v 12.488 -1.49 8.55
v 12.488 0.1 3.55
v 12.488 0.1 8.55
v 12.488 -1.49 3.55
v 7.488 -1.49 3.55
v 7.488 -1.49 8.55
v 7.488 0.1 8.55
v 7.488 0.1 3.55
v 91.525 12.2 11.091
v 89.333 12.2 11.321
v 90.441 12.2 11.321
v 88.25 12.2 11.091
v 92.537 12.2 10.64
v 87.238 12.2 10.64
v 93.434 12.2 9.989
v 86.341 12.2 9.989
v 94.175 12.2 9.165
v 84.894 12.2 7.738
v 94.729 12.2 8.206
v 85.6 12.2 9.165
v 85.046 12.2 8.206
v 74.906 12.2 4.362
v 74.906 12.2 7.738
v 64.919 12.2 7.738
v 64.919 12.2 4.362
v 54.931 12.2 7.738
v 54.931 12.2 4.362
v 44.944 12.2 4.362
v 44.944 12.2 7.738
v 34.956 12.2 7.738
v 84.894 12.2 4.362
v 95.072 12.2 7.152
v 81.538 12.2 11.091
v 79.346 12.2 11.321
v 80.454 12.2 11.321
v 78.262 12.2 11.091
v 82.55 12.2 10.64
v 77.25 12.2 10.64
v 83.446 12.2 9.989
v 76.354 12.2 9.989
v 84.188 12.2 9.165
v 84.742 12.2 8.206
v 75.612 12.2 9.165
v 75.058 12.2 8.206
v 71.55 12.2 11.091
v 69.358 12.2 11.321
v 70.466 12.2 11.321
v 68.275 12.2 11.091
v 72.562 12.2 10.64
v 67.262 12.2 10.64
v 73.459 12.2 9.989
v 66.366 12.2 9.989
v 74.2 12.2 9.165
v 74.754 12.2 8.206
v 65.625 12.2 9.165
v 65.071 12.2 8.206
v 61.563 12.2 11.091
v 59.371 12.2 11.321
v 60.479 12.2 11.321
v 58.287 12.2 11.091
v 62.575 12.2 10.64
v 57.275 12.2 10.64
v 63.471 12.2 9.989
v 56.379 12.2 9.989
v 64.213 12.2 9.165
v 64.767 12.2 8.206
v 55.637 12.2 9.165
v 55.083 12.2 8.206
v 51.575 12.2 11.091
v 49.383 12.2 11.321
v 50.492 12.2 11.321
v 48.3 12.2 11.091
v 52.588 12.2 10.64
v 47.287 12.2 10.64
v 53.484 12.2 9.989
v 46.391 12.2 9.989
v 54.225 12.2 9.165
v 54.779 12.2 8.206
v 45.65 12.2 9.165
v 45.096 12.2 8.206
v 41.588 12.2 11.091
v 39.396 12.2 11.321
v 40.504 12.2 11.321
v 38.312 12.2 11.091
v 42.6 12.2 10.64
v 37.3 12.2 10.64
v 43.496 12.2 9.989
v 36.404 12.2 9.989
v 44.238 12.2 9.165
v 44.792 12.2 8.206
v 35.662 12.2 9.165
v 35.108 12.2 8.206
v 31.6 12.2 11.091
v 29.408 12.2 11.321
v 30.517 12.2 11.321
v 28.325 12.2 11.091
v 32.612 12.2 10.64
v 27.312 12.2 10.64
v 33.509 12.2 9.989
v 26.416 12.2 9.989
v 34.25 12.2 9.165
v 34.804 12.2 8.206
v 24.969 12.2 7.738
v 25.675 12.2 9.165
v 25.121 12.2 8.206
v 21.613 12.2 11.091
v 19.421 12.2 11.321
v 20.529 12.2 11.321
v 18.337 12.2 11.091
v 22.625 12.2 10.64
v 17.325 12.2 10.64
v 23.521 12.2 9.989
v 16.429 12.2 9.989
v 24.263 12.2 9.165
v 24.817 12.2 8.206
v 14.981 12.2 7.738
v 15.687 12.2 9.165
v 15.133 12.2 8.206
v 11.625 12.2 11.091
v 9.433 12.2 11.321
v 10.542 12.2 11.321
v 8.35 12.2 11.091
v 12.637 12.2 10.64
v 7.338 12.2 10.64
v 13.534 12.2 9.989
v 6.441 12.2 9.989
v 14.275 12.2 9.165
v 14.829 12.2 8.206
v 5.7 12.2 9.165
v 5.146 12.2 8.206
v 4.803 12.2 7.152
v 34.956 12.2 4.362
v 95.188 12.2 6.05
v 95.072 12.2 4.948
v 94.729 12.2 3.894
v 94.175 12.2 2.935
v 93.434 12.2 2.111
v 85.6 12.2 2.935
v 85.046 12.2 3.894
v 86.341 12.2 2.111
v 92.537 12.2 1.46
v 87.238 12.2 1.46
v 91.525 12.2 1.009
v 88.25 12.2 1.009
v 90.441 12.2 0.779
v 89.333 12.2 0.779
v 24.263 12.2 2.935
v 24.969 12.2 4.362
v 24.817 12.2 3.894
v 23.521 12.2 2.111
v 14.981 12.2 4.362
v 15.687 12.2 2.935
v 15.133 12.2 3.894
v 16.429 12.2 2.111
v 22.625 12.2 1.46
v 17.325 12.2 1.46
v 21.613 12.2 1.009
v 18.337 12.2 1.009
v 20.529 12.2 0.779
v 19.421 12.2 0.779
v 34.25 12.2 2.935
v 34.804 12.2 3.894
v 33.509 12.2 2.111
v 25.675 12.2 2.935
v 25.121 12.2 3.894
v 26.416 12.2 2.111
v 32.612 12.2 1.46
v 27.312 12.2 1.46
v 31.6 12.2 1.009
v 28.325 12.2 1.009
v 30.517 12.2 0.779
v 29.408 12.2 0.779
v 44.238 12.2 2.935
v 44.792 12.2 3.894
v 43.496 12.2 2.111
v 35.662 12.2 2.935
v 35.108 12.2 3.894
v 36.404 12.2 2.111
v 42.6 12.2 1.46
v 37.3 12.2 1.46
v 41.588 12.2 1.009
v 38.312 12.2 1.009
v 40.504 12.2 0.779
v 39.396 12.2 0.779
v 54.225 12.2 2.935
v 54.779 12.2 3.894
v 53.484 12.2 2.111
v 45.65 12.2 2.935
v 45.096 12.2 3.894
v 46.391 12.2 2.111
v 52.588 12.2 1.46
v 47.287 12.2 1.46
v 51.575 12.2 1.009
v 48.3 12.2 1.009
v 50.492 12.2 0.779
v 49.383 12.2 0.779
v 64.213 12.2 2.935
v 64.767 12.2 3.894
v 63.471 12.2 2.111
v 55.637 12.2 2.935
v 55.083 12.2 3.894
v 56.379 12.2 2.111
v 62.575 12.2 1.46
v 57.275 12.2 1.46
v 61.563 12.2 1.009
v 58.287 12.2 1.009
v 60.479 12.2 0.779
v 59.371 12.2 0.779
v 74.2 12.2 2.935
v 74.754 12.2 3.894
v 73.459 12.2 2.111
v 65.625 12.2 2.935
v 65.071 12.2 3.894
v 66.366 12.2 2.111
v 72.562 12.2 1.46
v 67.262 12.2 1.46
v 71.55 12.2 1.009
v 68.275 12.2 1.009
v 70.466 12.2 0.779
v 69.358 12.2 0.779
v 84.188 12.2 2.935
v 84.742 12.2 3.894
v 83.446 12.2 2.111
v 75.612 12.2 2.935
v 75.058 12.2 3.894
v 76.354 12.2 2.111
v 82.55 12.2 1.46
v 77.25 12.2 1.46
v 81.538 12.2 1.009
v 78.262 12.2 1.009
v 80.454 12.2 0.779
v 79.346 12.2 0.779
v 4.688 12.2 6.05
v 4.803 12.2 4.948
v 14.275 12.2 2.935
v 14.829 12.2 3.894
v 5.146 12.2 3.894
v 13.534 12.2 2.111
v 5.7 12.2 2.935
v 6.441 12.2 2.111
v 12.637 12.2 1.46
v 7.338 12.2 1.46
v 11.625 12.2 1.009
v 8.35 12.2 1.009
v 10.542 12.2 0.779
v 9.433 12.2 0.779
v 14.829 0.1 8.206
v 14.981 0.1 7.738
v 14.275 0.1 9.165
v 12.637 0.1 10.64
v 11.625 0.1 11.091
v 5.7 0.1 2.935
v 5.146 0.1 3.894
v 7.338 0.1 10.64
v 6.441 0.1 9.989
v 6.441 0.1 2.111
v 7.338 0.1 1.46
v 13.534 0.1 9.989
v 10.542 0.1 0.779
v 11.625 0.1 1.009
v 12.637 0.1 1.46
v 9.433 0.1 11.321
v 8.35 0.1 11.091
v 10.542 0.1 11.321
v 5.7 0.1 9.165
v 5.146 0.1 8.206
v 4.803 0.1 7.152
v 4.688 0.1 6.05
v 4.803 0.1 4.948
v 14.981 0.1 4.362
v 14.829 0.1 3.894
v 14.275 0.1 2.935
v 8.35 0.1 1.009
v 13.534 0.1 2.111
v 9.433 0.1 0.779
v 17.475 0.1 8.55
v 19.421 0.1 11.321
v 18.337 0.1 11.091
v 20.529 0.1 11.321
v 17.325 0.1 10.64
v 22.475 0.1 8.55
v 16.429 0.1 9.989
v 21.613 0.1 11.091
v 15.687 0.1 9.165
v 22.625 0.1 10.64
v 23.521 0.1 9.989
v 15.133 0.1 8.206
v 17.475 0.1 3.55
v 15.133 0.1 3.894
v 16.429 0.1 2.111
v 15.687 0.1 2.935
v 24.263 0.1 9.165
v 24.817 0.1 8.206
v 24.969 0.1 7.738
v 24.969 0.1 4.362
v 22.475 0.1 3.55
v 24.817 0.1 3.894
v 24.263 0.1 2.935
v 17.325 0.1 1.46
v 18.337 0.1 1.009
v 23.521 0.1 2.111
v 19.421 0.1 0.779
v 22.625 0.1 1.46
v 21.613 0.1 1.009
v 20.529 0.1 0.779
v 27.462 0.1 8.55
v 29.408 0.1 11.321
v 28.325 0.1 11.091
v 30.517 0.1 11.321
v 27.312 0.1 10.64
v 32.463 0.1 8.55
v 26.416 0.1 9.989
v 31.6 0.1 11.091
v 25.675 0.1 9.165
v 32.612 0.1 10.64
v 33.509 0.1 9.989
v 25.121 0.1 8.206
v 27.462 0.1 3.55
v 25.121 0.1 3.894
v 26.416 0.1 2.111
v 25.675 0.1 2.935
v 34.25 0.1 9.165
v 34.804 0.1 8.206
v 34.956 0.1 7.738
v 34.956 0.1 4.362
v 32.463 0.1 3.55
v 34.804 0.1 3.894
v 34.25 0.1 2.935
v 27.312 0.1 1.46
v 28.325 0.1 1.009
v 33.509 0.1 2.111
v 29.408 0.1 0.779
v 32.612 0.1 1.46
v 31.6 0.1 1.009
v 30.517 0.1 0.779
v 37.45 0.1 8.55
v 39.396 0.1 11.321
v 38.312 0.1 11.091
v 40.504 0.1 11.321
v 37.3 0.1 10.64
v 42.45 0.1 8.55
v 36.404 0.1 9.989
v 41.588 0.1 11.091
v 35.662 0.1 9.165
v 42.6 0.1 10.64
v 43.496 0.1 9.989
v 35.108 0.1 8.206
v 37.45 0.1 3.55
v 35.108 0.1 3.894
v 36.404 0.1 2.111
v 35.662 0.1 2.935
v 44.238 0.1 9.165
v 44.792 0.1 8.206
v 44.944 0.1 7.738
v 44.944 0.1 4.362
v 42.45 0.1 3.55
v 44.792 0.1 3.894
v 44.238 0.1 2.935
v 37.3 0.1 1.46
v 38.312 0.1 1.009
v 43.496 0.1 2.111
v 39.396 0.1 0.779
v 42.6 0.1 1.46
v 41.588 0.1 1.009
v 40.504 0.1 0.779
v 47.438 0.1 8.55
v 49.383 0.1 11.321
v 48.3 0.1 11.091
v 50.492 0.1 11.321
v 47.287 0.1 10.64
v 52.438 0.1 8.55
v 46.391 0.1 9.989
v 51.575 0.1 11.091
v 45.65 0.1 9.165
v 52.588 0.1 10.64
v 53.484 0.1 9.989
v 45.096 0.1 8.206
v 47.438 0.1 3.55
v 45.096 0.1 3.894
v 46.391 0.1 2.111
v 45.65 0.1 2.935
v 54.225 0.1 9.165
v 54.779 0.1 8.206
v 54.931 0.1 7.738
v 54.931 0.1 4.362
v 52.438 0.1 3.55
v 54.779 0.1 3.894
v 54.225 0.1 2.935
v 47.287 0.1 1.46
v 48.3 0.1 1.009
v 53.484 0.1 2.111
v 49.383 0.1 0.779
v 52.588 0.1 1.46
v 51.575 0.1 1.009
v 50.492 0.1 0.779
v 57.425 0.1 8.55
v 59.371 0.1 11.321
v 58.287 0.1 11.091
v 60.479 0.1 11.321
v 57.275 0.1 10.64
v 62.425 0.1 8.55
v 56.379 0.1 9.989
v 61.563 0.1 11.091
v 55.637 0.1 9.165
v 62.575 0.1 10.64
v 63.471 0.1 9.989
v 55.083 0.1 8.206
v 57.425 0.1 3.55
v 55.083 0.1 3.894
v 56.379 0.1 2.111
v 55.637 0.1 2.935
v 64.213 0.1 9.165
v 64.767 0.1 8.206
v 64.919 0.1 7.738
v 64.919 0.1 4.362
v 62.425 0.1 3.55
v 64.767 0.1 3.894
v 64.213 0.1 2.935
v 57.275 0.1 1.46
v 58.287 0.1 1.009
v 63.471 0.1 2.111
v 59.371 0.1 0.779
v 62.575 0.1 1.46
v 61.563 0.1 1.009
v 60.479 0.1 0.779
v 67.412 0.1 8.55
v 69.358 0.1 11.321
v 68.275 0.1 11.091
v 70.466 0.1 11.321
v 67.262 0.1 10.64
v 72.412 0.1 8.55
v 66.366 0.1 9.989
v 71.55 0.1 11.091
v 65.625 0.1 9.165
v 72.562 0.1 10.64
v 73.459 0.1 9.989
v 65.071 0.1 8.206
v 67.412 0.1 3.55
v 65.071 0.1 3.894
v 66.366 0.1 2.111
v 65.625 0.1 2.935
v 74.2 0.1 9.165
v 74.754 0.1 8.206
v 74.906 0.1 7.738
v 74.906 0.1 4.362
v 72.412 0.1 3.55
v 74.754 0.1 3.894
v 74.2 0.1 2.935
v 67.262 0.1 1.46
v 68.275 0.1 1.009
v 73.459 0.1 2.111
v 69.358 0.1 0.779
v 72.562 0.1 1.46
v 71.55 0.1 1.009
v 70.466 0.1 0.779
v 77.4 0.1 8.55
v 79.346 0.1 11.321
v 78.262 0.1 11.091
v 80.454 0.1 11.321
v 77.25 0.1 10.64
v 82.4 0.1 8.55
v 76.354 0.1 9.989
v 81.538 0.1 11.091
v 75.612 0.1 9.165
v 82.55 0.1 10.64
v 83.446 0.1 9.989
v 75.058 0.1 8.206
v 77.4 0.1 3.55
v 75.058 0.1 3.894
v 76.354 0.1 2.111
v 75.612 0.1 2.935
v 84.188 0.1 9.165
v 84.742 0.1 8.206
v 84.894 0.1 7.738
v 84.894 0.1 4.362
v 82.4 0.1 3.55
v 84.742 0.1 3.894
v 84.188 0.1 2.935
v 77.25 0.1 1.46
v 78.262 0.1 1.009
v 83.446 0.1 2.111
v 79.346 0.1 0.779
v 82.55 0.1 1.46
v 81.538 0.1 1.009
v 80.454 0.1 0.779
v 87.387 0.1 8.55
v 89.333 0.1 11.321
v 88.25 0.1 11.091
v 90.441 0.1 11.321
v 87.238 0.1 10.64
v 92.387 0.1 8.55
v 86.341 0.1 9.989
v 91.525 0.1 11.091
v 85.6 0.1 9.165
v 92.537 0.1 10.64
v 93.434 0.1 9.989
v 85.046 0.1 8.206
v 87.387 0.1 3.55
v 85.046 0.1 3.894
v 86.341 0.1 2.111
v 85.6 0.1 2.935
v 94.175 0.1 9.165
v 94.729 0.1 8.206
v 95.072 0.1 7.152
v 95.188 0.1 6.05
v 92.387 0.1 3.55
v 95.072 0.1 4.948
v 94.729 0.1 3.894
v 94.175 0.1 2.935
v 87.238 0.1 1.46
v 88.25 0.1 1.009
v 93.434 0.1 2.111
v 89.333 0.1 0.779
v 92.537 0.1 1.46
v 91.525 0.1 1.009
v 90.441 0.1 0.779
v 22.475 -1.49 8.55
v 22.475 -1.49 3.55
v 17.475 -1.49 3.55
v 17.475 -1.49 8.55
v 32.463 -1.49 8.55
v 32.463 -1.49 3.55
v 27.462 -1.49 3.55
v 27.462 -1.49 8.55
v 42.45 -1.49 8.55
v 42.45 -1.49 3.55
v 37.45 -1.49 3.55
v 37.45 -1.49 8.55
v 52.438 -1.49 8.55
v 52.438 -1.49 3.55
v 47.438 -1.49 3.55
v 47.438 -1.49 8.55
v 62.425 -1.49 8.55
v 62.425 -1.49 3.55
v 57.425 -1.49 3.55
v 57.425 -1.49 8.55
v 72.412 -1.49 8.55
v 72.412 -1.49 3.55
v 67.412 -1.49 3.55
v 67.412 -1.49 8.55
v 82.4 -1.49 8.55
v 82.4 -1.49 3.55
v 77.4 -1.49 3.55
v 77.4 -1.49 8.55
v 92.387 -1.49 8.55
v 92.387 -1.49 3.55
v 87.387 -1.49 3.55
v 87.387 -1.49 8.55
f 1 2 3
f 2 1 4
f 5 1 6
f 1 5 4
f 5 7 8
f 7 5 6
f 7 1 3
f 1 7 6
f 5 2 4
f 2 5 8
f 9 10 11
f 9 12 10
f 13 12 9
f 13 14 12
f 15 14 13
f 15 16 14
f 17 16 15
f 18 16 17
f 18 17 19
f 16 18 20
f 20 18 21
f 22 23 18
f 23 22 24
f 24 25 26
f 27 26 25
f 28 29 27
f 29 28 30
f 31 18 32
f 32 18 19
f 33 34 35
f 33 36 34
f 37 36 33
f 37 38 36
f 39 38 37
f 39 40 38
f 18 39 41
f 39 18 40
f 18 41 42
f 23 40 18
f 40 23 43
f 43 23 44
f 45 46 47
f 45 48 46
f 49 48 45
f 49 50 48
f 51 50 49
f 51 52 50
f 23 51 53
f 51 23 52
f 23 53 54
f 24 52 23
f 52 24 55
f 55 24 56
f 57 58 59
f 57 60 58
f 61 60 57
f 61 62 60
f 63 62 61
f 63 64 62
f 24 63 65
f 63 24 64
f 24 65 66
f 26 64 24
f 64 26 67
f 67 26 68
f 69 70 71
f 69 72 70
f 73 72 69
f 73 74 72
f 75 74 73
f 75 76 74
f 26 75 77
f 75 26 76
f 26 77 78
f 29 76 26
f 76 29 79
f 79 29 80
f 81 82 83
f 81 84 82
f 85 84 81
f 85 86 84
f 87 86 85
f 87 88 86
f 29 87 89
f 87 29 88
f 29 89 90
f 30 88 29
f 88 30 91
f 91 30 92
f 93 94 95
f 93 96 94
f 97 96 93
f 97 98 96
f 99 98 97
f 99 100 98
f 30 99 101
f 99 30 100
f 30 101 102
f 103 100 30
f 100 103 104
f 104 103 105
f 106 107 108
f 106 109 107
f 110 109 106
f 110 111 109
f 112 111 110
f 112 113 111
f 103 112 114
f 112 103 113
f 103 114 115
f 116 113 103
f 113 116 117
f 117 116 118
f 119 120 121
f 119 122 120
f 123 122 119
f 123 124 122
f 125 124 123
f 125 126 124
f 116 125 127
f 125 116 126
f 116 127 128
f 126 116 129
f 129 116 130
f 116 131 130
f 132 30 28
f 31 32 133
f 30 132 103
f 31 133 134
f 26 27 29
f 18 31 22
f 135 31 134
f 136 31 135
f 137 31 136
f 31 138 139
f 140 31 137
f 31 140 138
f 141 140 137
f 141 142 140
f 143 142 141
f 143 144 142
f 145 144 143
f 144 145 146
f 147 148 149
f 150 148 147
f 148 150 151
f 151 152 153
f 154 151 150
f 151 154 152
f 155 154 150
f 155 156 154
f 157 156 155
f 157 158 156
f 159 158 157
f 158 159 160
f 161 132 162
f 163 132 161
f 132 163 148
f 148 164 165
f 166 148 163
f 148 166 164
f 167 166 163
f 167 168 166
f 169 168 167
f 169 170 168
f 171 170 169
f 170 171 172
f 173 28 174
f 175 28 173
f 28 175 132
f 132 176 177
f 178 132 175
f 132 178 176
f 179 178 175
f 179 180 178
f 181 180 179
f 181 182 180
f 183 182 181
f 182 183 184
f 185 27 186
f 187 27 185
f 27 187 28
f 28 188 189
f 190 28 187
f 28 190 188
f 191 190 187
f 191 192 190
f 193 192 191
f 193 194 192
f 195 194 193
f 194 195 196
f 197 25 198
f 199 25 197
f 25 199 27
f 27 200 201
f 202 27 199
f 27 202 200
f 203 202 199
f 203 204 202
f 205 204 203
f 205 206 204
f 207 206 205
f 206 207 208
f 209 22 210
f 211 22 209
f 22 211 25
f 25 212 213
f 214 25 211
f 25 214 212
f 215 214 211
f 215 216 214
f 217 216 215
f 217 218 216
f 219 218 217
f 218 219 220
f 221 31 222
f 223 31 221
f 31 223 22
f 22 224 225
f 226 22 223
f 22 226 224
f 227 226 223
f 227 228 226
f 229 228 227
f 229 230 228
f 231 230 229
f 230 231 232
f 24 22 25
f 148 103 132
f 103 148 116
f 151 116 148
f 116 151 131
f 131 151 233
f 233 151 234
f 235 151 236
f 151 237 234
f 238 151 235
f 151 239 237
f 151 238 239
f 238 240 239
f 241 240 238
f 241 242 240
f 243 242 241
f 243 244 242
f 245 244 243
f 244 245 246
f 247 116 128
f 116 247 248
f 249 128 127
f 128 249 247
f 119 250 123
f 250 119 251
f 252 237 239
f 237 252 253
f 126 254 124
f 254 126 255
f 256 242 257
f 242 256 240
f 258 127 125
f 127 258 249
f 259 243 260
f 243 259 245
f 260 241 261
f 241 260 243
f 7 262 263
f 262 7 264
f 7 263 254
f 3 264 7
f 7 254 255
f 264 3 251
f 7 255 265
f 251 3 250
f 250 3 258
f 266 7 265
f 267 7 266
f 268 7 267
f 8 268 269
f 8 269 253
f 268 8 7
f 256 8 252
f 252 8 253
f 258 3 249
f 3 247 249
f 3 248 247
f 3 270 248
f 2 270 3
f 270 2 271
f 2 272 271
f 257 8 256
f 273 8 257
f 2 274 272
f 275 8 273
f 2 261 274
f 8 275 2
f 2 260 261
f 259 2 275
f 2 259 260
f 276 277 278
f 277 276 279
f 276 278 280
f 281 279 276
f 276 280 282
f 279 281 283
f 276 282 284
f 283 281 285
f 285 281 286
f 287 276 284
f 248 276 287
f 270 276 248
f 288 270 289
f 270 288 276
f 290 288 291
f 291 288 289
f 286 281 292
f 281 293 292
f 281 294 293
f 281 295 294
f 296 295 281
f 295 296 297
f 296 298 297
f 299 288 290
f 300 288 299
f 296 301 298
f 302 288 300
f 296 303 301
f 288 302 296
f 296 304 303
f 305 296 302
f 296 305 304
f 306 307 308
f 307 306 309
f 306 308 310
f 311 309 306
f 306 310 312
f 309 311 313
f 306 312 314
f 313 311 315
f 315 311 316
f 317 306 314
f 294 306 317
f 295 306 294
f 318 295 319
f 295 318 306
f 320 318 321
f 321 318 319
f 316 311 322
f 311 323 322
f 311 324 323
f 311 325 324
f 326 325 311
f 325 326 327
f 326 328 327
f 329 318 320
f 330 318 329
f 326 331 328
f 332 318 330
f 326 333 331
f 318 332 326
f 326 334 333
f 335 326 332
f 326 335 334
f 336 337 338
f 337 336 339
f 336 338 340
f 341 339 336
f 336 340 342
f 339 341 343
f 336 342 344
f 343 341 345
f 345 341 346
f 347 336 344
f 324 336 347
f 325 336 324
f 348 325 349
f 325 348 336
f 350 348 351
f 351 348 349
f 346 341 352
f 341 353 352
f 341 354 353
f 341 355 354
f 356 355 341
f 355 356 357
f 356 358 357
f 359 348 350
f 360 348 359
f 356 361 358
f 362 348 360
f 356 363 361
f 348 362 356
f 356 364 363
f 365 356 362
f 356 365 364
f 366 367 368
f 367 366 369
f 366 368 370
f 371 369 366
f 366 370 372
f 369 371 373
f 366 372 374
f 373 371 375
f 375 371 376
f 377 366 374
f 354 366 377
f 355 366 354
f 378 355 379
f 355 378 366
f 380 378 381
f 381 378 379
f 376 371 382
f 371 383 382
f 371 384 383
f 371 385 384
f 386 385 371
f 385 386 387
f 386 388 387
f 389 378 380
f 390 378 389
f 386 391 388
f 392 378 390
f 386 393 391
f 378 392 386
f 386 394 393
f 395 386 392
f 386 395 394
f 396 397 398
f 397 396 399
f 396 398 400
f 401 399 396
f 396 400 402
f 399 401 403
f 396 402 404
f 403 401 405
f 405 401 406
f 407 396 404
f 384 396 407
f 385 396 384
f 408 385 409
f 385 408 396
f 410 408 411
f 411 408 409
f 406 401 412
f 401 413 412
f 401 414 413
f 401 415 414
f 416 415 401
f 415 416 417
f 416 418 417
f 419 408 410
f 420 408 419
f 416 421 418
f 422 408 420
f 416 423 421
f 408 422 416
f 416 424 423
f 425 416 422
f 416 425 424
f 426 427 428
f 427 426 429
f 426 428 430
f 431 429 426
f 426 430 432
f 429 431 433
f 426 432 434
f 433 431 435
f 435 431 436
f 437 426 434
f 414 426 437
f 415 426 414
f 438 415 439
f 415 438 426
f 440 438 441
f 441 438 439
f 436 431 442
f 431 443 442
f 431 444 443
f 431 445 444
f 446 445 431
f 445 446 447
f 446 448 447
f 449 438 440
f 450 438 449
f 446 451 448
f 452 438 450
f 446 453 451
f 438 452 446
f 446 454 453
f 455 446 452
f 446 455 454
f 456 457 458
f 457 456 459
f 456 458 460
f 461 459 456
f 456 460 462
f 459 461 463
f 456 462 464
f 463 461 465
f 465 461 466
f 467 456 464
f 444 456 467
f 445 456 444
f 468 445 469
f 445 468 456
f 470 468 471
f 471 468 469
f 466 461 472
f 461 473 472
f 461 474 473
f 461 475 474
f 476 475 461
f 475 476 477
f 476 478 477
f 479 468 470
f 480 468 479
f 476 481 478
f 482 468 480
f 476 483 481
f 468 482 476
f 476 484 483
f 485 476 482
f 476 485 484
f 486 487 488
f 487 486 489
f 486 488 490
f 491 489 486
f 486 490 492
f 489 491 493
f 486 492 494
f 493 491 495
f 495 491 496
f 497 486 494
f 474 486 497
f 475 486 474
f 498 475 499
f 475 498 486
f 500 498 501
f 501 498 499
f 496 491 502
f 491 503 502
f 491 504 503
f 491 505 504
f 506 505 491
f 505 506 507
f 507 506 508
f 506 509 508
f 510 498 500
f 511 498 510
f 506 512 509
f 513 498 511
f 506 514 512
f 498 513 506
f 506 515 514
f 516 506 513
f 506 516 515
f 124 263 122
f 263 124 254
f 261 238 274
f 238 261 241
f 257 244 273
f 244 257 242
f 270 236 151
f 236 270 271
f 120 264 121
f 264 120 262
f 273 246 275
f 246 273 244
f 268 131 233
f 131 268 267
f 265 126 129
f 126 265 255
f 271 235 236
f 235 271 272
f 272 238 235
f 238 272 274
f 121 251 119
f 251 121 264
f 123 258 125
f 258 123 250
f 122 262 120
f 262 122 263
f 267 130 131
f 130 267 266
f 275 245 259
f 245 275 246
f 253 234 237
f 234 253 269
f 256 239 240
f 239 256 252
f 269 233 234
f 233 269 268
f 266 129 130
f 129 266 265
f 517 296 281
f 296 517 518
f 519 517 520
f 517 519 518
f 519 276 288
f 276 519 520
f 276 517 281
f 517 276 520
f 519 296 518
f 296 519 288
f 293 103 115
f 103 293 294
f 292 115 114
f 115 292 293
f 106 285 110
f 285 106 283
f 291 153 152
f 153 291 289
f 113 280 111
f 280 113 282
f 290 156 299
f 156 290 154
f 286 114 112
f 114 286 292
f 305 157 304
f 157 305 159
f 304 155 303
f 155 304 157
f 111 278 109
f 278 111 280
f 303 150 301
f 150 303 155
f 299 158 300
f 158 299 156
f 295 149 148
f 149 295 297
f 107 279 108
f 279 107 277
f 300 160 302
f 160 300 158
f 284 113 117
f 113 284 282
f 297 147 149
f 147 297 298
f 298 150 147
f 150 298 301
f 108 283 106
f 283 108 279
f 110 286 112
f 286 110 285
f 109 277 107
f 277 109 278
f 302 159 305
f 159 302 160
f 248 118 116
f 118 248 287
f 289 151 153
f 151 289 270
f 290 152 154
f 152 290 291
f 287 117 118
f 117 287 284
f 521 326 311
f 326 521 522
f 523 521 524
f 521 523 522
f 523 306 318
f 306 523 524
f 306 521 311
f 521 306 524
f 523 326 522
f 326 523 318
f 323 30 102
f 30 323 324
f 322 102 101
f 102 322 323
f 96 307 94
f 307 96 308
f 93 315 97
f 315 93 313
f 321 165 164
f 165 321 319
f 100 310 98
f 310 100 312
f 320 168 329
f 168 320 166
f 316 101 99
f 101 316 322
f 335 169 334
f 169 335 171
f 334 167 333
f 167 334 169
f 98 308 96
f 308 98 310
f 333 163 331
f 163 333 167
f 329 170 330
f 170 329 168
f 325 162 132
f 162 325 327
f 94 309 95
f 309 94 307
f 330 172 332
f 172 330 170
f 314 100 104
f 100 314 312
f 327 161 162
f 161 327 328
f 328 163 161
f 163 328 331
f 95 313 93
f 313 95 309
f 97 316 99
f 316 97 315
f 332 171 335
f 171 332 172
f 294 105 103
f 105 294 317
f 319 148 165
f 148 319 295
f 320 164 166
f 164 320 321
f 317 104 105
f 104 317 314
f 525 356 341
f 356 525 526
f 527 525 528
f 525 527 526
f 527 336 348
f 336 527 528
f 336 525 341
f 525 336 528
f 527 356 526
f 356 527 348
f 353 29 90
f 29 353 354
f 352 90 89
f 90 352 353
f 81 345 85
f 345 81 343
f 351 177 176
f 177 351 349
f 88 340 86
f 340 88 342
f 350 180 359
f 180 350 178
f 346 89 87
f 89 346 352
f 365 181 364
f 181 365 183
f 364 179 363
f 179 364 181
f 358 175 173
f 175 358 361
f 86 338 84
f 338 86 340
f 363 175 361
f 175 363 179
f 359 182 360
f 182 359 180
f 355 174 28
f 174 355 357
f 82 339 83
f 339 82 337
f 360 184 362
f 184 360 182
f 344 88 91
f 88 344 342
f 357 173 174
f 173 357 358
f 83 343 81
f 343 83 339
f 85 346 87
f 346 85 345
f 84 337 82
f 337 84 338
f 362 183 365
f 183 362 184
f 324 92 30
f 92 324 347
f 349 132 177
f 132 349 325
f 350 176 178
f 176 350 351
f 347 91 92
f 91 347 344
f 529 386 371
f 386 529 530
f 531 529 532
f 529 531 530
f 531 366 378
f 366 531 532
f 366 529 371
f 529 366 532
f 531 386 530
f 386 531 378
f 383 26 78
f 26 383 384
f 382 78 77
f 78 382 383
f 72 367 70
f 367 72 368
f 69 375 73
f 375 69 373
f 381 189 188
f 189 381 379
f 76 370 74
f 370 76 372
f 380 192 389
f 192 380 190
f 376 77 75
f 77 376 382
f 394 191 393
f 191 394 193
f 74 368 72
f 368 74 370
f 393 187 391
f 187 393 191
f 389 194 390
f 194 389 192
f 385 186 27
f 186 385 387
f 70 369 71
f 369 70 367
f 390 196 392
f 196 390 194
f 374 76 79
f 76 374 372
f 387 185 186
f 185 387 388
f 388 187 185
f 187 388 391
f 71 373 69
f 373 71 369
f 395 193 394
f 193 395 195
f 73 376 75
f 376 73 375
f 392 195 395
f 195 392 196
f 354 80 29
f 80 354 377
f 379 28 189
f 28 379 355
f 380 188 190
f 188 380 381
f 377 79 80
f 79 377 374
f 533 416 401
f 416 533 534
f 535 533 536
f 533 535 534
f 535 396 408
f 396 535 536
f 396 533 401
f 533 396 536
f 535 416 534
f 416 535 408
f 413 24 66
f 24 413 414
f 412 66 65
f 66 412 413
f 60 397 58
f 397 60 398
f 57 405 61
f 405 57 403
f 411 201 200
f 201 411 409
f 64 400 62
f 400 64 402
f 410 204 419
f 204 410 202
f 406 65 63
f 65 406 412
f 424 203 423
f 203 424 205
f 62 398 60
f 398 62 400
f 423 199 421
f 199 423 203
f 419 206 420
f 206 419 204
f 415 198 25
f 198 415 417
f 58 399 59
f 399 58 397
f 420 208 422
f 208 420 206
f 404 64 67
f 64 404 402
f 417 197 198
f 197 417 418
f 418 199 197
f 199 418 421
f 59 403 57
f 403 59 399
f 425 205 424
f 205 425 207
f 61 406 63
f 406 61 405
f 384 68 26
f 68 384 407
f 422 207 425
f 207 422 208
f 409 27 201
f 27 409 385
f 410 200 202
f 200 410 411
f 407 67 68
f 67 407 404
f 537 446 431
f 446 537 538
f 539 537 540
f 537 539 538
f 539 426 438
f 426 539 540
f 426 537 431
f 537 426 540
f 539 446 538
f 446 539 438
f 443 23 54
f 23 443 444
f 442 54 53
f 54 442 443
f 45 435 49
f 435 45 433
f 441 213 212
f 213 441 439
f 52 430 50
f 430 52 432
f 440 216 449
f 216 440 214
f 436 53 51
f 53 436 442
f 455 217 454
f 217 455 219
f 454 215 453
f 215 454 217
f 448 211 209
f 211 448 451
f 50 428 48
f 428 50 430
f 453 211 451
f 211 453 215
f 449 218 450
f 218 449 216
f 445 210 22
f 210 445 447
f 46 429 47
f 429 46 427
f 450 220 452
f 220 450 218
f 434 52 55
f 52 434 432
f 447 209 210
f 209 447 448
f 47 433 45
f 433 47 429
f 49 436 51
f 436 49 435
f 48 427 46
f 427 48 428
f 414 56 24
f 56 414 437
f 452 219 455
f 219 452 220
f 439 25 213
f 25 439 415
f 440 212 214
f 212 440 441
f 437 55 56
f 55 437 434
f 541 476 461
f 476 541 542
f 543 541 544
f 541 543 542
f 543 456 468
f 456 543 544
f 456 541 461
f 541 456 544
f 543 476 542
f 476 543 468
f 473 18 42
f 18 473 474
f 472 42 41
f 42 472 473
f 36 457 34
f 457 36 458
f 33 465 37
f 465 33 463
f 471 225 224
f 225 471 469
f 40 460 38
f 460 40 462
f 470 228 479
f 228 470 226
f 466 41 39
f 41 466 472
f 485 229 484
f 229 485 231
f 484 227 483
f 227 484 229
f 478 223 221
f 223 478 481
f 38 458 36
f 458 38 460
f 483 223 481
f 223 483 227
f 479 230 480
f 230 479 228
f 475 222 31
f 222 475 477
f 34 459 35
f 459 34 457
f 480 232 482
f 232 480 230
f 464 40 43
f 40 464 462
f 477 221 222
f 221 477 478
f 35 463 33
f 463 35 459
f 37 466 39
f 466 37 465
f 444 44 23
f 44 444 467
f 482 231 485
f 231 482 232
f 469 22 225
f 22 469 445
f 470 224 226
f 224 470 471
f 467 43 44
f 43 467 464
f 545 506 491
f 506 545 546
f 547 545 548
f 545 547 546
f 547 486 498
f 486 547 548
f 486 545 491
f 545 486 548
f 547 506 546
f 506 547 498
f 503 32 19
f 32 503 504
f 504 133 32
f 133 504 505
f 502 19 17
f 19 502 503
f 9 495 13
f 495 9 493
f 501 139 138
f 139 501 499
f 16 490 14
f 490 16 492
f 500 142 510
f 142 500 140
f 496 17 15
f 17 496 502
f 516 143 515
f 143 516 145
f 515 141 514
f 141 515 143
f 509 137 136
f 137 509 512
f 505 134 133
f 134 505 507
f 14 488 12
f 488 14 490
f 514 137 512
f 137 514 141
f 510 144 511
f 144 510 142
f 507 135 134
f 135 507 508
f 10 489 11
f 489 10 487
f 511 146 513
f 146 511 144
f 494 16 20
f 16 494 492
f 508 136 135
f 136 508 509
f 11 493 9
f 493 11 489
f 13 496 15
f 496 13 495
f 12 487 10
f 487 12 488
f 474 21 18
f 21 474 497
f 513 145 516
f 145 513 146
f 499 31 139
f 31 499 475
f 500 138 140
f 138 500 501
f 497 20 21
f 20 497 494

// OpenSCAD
// file: ../lib/neo_pixel.scad
///< Alitovo Neo pixel RGB X000UCVKBH 2812b-1-LED-WH
use <../lib/math.scad>;
use <../lib/utils.scad>;

///< Parameters - Begin
led_assembly_h = 2.8;
led_assembly_d = 9.6;

///< Diameter of the PCB 
pcb_d = 9.6;
pcb_h = 1.2;

///< Demensions of the LED IC
led_w = 5;
led_d = led_w;
led_h = led_assembly_h - pcb_h;


///< Modules
module pcb(h = pcb_h, d = pcb_d){
     ///< LED PCB definition
     ///< The h/d parameters are passed in to
     ///< allow for socketing of the LEDs.
     color( rand_clr() )cylinder( h=h, d=d, $fn = 30 );
}

module led(){
     ///< Neo pixel LED (2812b-1)
     union(){
         color( rand_clr() )cube( [ led_w, led_d, led_h ] );
         color( rand_clr() )
              translate([led_w/2,led_d/2, 0] )
              cylinder( h=led_h, d= led_w, $fn = 30 );
         }
}

module neo_pixel(h=pcb_h, d=pcb_d){
     ///< Assembly of the led and pcb_pad
     union(){
          translate([-led_w/2,-led_d/2,h-0.01])led();
          pcb(h=h, d=d);
          }

}

///< Build object
///< Remove this when including
//neo_pixel();
// file: ../lib/utils.scad
///< Utilities

function rand_clr() = rands( 0,1,3 );

///< Length conversions
function in2mm( i ) = ( i * 25.4 ); 
function mm2in( m ) = ( m / 25.4 );

/// This is pulled from stackoverflow
/// https://stackoverflow.com/questions/45826208/openscad-rotating-around-a-particular-point

// rotate as per a, v, but around point pt
module rotate_about_pt(a, v, pt) {
    translate(pt)
        rotate(a,v)
            translate(-pt)
                children();   
}
// file: ../lib/math.scad
///< Math scad module


///< Find the hypotenuse from two sides of a right triangle
function hyp_from_sides( a, b ) = sqrt( pow( a, 2 ) + pow( b, 2 ) );

///< Find equal sides from hypotenuse of a right triangle
function sides_from_hyp(h) = sqrt( pow( h, 2 ) / 2 );

///< Find A from hypotenuse and B
function a_from_hb( h, b ) = sqrt( pow( h, 2 ) - pow( b, 2 ) );

function dist_2d( pt2, pt1 ) = sqrt(pow(( pt2[0]-pt1[0] ),2) + pow(( pt2[1]-pt1[1]),2) );

function mid_pt_2d( pt2, pt1 ) = [( pt1[0]+pt2[0] )/2, ( pt1[1]+pt2[1] )/2, 0 ];
///< Test for math functions

A = 3;
B = 4;
echo("Given A=", A, "and B=", B );
H = hyp_from_sides( A, B );
echo("Hypotenuse=", H );
echo("Calc Correct = ", (H == 5) );

echo("Given H=", H, " which is a hypotenuse with equal sides" );
echo( "the sides=", sides_from_hyp( H ) );

echo("Given H=", H, "B=", 4 );
echo("A=", a_from_hb( H, 4 ) );

echo("Distance from [-1,1] and [3,4] = ", dist_2d( [-1,1],[3,4]) );
// main file
///< LED frame for the neo pixel array
use <../lib/math.scad>;
use <../lib/utils.scad>;
include <../lib/neo_pixel.scad>

///< Parameters
pcb_socket_d = led_assembly_d + 1;
pcb_socket_h = 1.0;

led_array_w  = 100;
led_array_d  = led_assembly_h+pcb_socket_h;
led_array_h  = pcb_socket_d+1.5;

///< Modules
module led_array( w, d, h, num_leds = 10 ){
    led_spacing_w = (w - 0.125)/( num_leds );

    ///< Make x number of slots
    for (i = [0:num_leds]){
        offset_spacing = (( i * led_spacing_w ) + ( led_spacing_w ));
        remaining = w - offset_spacing;
        if( remaining >= led_spacing_w ){
            translate( [ offset_spacing, (h+0.1), h/2 ] )
                rotate( [ 90, 0, 0 ])
                color( rand_clr() )
                neo_pixel( h=h, d=pcb_socket_d);
        }
    }
}

///< Build object
led_array( led_array_w, led_array_d, led_array_h );
